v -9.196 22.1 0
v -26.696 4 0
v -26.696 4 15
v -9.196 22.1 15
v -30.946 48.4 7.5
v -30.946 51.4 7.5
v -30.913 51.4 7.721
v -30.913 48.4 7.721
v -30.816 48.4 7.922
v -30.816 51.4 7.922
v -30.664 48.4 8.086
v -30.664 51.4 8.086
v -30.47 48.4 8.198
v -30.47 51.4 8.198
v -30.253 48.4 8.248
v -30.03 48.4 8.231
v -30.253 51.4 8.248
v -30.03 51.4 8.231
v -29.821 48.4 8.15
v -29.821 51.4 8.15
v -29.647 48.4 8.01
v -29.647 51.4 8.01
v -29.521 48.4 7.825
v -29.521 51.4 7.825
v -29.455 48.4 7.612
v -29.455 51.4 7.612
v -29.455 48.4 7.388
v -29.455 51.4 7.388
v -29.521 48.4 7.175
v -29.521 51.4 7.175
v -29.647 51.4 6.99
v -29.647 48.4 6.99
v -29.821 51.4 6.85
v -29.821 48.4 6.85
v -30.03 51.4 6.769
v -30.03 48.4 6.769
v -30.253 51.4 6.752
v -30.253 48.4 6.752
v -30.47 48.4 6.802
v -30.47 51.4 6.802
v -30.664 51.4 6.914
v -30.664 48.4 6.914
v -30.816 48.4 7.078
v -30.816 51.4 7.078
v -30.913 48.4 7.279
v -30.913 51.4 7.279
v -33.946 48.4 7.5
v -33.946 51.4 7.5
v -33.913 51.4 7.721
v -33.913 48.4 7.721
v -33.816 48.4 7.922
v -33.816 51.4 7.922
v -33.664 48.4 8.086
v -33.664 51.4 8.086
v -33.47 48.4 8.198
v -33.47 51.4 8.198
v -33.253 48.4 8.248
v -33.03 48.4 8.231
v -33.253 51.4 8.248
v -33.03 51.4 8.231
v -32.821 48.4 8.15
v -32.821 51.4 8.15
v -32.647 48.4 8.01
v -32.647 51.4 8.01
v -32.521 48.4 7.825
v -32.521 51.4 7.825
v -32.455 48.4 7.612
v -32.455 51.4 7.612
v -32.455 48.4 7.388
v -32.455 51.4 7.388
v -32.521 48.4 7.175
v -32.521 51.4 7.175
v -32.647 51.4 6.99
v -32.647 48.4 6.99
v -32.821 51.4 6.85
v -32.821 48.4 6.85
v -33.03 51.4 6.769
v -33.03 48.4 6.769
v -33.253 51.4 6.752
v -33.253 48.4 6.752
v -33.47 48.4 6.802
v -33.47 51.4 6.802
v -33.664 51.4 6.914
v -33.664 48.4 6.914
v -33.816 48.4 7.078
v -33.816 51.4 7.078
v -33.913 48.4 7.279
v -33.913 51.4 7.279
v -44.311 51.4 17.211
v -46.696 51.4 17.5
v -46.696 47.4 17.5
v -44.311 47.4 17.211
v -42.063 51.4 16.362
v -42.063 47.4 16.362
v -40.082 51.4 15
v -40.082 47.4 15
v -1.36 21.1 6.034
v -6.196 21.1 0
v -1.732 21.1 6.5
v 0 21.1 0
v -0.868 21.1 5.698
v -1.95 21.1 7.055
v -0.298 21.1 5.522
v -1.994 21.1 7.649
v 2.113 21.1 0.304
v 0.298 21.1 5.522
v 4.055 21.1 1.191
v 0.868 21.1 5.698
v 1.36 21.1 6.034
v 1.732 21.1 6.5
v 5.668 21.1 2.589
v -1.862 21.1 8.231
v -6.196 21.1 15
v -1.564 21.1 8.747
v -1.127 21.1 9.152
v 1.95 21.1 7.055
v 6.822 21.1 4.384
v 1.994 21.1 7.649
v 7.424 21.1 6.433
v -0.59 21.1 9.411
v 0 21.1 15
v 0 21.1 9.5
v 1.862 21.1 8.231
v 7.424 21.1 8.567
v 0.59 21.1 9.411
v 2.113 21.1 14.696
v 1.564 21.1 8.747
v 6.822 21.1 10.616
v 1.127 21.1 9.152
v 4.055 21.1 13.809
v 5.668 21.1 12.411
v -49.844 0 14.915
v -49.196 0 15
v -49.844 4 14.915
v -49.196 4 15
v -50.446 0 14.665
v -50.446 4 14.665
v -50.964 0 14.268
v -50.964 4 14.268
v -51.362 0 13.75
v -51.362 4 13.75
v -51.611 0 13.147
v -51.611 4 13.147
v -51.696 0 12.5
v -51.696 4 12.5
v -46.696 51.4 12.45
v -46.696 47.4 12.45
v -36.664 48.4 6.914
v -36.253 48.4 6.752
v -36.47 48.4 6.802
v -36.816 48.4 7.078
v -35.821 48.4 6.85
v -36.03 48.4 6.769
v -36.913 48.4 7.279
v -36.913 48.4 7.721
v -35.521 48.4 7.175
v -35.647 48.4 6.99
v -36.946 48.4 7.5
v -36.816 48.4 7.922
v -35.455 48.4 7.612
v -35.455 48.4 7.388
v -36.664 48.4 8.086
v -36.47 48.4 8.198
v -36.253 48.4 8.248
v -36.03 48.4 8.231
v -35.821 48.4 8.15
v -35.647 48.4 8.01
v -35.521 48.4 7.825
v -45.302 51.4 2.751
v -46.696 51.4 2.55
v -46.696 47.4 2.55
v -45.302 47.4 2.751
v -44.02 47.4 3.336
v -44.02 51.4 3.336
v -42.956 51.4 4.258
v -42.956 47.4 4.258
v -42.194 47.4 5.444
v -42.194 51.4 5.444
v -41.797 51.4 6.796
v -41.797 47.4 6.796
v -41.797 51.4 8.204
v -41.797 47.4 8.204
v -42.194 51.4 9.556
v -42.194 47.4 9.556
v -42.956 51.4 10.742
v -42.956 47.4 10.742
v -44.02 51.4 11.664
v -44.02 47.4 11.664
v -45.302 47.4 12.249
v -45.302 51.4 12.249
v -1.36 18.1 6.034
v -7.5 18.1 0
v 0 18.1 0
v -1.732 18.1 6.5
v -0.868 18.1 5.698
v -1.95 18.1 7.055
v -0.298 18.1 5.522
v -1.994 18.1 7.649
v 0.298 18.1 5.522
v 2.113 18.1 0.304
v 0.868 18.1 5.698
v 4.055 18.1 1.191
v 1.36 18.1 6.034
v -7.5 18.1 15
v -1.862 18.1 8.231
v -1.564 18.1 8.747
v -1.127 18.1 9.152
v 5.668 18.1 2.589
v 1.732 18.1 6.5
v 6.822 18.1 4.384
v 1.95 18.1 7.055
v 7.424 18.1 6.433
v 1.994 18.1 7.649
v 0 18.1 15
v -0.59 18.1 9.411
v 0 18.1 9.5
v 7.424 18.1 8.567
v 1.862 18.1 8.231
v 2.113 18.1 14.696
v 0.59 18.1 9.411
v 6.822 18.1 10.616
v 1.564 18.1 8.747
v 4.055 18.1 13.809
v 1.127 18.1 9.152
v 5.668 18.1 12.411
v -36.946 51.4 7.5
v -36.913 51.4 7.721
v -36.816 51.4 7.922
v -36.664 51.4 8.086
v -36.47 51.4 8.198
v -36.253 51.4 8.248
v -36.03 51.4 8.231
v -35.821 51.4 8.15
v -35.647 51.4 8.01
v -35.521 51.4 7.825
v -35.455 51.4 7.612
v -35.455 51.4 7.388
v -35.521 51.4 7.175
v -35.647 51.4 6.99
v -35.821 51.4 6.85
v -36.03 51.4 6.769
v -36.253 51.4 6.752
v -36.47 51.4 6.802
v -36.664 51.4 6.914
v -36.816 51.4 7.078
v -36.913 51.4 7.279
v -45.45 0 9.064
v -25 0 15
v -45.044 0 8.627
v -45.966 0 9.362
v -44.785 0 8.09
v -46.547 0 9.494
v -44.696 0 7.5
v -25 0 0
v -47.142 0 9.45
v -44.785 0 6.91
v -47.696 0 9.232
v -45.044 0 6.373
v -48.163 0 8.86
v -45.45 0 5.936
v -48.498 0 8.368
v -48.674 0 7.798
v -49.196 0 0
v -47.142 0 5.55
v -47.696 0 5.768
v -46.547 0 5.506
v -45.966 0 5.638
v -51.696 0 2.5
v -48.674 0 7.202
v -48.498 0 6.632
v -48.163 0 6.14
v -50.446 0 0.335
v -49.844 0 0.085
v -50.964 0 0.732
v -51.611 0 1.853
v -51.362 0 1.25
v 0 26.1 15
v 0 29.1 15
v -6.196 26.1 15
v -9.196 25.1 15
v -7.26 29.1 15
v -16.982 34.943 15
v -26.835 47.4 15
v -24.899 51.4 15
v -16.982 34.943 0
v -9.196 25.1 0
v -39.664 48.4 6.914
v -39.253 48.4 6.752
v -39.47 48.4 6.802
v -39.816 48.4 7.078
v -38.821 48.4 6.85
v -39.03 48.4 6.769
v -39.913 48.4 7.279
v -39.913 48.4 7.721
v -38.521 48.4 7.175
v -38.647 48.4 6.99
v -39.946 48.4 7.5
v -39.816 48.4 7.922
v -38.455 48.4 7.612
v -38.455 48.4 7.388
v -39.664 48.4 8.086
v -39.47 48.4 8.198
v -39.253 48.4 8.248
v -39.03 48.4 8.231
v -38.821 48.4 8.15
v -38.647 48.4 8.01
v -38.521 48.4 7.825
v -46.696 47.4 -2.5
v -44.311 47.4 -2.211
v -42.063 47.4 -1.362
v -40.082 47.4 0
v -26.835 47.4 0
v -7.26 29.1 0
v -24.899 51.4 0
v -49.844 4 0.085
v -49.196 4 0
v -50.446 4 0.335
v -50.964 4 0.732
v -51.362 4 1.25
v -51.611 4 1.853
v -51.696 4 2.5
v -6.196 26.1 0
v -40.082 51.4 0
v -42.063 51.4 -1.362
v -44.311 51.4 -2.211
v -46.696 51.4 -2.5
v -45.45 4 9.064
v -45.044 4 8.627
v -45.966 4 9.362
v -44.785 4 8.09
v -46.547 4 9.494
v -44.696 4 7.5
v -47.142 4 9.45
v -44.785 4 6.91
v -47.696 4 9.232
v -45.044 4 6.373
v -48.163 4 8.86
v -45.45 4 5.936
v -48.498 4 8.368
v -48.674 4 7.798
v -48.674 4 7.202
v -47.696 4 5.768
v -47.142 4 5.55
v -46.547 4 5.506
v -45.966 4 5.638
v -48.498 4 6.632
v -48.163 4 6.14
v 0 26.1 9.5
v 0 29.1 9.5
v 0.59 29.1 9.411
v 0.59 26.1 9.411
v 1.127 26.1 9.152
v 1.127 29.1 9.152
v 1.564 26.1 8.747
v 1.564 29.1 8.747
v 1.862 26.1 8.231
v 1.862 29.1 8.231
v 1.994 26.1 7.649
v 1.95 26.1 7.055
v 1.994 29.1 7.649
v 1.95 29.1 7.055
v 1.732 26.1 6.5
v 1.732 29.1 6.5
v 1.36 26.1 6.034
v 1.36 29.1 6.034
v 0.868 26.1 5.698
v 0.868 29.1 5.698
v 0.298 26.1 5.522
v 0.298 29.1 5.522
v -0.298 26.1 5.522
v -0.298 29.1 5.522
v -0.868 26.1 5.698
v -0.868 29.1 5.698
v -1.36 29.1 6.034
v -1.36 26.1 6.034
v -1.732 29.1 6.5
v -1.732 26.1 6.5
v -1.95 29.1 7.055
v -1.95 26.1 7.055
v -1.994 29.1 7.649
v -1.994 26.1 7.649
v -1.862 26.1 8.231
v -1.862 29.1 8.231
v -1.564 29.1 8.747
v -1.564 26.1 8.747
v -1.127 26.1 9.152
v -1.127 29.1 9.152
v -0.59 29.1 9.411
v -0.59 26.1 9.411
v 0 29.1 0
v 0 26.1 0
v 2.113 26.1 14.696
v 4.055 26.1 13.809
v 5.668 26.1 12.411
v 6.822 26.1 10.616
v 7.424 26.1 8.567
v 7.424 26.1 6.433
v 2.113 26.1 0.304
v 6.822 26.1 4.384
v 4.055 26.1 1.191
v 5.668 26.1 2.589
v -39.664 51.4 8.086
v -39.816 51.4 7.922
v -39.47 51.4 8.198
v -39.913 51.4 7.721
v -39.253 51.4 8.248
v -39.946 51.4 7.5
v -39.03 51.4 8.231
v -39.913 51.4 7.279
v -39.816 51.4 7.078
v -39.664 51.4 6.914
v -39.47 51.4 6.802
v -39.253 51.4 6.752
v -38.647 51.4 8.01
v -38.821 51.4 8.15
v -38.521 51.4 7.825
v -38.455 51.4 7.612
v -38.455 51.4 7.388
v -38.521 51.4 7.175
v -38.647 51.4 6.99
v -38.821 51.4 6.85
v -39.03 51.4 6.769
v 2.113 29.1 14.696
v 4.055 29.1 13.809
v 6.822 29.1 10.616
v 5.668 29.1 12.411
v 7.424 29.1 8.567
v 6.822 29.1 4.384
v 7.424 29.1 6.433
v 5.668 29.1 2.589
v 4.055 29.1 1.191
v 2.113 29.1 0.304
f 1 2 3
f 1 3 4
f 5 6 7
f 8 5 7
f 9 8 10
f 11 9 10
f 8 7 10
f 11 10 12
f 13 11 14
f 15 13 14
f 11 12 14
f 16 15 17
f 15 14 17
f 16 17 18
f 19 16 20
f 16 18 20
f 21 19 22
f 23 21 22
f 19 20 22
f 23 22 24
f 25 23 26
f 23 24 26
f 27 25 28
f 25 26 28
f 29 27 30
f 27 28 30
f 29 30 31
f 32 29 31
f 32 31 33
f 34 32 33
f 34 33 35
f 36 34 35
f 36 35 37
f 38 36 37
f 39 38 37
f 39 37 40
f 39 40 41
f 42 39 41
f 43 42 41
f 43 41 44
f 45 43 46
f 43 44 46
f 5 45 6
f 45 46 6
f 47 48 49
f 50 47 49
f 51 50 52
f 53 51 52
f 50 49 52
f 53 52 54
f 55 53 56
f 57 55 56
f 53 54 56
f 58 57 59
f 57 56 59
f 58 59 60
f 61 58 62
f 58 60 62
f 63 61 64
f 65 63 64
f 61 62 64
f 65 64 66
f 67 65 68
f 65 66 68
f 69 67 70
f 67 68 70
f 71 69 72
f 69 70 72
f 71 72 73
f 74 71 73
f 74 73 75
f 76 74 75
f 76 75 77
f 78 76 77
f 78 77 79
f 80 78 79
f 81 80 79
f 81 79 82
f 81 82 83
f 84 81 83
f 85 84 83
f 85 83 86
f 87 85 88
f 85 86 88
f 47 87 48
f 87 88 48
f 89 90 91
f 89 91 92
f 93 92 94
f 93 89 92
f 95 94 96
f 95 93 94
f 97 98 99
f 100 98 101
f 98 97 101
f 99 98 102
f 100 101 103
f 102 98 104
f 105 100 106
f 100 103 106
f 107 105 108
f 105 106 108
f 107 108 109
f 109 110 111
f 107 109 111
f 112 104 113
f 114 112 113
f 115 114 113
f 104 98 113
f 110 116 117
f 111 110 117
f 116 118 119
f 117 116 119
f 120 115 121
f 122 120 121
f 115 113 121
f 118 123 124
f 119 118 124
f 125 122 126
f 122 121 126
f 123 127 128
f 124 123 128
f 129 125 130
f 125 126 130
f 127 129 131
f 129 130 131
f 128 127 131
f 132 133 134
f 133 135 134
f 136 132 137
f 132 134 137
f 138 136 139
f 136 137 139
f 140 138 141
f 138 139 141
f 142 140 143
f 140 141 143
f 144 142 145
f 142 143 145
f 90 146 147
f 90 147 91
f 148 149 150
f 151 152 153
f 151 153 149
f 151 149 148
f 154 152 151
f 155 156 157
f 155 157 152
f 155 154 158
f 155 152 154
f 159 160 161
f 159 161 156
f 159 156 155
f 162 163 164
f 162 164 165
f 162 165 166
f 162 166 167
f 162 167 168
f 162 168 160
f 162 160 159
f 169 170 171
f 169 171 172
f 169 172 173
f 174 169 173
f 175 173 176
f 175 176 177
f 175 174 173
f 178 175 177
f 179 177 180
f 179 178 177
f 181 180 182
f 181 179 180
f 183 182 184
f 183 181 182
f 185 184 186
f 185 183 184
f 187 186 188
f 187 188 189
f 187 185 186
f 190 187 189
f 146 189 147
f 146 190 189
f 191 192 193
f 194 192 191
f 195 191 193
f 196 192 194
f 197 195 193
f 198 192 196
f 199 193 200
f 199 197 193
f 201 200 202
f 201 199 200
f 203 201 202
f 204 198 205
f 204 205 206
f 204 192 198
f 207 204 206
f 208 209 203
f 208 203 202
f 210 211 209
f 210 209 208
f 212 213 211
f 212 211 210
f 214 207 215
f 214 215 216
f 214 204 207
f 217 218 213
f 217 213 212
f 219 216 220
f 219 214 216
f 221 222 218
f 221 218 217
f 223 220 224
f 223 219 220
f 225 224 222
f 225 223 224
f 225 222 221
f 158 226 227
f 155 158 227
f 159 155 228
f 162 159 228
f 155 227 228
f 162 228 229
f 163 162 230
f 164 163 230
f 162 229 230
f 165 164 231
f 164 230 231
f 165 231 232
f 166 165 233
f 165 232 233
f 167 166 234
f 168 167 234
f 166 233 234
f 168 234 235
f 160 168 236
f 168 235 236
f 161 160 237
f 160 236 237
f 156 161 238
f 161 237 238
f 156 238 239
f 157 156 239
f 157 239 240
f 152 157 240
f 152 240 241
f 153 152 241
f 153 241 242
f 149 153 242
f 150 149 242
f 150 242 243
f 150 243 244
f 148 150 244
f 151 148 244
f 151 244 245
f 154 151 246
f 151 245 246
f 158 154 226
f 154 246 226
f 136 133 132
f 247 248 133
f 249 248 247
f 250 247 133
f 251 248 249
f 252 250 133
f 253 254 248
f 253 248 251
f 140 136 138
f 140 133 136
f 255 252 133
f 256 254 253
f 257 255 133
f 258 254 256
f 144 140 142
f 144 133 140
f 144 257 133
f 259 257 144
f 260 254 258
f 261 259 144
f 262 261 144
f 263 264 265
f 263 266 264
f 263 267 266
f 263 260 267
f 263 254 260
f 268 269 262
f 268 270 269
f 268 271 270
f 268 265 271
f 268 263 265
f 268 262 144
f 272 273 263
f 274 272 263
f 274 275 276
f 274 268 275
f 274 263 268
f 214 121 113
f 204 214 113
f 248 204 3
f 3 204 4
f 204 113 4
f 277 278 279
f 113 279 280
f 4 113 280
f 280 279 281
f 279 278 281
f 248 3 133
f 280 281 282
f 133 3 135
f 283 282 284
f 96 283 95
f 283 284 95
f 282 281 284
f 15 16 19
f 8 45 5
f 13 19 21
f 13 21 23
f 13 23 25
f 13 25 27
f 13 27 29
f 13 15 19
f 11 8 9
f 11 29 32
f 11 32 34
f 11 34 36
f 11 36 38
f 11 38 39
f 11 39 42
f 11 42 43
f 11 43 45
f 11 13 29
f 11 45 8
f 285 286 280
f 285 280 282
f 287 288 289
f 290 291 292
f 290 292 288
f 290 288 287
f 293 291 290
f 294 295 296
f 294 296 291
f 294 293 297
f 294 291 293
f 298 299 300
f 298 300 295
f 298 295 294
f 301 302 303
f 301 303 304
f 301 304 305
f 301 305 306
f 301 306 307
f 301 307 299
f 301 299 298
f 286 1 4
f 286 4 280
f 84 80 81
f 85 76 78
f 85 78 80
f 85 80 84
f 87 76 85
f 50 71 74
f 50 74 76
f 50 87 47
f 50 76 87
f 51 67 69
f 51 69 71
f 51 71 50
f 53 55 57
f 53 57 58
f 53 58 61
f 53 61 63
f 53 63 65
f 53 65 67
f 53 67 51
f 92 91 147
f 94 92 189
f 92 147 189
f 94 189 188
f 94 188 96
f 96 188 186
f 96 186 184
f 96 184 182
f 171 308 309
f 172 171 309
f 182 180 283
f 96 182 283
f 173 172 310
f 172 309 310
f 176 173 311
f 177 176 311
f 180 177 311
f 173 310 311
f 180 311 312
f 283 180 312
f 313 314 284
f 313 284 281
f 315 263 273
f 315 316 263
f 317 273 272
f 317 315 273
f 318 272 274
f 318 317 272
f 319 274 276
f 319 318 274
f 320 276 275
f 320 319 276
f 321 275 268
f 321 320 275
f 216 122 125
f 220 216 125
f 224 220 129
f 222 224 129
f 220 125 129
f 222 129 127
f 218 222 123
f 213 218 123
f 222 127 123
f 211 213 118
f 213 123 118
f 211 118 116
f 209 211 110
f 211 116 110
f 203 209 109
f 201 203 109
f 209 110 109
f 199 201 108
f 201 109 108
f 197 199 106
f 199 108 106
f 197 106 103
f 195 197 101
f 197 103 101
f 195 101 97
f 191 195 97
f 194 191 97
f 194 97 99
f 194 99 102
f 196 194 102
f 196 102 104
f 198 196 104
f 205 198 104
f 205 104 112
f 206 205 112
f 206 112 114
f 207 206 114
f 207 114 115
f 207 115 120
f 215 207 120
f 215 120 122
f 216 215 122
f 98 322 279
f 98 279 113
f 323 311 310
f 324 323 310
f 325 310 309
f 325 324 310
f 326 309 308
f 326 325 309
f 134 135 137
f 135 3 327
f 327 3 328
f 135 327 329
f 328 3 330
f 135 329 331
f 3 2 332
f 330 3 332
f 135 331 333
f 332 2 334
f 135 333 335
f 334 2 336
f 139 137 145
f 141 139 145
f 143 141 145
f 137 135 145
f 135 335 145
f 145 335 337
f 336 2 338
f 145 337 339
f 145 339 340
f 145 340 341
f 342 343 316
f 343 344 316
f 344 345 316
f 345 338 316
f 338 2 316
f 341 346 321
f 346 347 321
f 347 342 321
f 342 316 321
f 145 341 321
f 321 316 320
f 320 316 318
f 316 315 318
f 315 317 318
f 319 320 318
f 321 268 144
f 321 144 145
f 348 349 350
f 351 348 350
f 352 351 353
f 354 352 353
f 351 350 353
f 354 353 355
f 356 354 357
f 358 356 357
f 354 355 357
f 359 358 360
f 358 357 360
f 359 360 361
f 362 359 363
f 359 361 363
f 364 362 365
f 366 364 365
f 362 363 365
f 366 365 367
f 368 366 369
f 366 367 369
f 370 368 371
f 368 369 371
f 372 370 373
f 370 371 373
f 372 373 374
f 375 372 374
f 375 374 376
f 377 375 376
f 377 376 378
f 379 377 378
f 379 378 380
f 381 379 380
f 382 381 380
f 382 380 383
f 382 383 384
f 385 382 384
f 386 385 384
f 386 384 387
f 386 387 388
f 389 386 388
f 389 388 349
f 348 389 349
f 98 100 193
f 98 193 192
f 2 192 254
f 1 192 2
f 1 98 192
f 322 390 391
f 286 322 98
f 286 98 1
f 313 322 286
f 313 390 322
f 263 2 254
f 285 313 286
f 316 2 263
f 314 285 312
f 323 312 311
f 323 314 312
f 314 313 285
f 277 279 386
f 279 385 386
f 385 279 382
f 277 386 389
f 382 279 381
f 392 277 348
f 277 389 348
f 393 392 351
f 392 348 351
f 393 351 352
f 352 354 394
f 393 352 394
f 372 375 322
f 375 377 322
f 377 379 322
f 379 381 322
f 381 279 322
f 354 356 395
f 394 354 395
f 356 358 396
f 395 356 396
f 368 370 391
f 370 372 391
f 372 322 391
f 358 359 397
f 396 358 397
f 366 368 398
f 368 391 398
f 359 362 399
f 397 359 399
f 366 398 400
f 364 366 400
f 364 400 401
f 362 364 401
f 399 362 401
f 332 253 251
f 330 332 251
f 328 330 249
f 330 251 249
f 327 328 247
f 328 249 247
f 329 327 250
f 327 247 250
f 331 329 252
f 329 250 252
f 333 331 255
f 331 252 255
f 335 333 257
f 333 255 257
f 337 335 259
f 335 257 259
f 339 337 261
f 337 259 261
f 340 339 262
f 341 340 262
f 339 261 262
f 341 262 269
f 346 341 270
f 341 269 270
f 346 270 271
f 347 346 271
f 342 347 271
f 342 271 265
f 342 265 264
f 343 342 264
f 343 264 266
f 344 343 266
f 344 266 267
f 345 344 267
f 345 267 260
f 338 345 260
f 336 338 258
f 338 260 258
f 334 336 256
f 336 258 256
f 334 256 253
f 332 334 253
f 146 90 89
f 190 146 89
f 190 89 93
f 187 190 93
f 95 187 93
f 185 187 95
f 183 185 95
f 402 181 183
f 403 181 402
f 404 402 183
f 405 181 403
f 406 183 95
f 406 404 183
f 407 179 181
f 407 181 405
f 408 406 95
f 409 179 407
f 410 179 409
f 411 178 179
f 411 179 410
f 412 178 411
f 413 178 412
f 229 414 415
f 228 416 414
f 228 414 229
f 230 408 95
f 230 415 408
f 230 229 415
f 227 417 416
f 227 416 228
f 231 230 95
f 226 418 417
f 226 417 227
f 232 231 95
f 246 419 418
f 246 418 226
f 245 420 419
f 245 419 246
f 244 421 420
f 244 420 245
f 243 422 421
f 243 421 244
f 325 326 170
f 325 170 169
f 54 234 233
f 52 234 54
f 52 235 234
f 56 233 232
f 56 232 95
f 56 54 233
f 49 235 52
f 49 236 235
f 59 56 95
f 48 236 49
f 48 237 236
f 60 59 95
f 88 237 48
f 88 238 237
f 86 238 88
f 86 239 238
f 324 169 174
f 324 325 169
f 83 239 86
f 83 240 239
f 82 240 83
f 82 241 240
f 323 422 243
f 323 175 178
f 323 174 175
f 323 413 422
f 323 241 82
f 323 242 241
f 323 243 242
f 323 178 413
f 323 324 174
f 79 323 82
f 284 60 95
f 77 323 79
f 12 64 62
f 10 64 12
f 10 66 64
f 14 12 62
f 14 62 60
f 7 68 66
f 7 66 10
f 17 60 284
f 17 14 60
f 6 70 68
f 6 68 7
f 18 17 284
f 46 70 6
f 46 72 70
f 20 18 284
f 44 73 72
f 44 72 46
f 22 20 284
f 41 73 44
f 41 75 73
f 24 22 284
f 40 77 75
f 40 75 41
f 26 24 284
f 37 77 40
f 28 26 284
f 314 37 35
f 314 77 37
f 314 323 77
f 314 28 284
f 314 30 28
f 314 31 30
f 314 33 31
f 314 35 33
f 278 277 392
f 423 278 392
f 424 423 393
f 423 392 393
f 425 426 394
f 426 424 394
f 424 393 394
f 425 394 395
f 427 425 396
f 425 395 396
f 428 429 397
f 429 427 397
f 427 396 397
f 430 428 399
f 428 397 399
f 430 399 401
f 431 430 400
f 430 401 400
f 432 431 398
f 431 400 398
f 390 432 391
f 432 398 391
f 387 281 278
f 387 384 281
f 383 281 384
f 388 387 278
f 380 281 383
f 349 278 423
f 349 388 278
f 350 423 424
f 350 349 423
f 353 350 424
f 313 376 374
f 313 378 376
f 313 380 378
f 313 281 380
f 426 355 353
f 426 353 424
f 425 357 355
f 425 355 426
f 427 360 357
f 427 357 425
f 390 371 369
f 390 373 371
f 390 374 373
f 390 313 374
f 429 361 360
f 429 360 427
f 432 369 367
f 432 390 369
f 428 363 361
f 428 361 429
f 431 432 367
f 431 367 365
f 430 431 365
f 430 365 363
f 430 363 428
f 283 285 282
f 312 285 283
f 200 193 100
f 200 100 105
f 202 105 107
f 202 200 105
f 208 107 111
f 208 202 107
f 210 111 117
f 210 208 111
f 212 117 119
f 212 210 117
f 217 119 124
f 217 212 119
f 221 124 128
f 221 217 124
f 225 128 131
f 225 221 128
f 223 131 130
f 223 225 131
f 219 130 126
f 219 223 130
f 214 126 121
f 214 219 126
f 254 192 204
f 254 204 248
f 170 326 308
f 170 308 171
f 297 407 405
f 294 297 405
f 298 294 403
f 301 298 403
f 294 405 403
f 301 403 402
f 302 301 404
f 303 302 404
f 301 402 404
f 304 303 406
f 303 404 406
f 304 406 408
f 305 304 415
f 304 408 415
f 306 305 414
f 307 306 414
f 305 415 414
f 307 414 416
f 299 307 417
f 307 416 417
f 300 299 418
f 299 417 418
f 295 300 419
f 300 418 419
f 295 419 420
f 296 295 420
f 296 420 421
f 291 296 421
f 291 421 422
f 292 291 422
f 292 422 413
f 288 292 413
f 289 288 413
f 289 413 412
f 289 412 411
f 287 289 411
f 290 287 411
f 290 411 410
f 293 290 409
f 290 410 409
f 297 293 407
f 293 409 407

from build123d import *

# Parameters (mm, degrees)
EXTRUDE_1_DEPTH     = 15
SKETCH_2_R          = 2
CUT_EXTRUDE_1_DEPTH = 4
SKETCH_3_R          = 7.5
EXTRUDE_2_DEPTH     = 3
EXTRUDE_START       = -3
SKETCH_4_R          = 7.5
EXTRUDE_3_DEPTH     = 3
SKETCH_5_R          = 2
CUT_EXTRUDE_2_DEPTH = 11
EXTRUDE_4_DEPTH     = 4
SKETCH_6_R          = 0.75
CUT_EXTRUDE_3_DEPTH = 3
FILLET_1_R          = 2.5


with BuildPart() as part:
    # 草圖1 → 填料-伸長1 (new body)
    with BuildSketch(Plane.XY):
        Polygon((-24.89877099, 51.4), (-7.260334344, 29.1), (0, 29.1), (0, 26.1), (-6.196480976, 26.1), (-6.196480976, 21.1), (0, 21.1), (0, 18.1), (-7.5, 18.1), (-25, 0), (-51.696480976, 0), (-51.696480976, 4), (-47.696480976, 4), (-26.696480976, 4), (-9.196480976, 22.1), (-9.196480976, 25.1), (-16.981570729, 34.942567398), (-26.834917623, 47.4), (-41.746480973, 47.4), (-41.746480973, 51.4), align=None)
    extrude(amount=EXTRUDE_1_DEPTH)

    # 草圖2 → 除料-伸長1 (cut)
    with BuildSketch(Plane.XZ):
        with Locations((-46.696480976, 7.5)):
            Circle(SKETCH_2_R)
    extrude(amount=-CUT_EXTRUDE_1_DEPTH, mode=Mode.SUBTRACT)

    # 草圖3 → 填料-伸長2 (add)
    with BuildSketch(Plane.XZ.offset(-18.1)):
        with Locations((0, 7.5)):
            Circle(SKETCH_3_R)
    extrude(amount=-EXTRUDE_2_DEPTH)

    # 草圖4 → 填料-伸長3 (add)
    with BuildSketch(Plane(origin=(0, 29.1, 0), x_dir=(1, 0, 0), z_dir=(0, 1, 0)).offset(EXTRUDE_START)):
        with Locations((0, -7.5)):
            Circle(SKETCH_4_R)
    extrude(amount=EXTRUDE_3_DEPTH)

    # 草圖5 → 除料-伸長2 (cut)
    with BuildSketch(Plane(origin=(0, 29.1, 0), x_dir=(1, 0, 0), z_dir=(0, 1, 0))):
        with Locations(Location((0, -7.5, 0), (0, 0, 270))):
            Circle(SKETCH_5_R)
    extrude(amount=-CUT_EXTRUDE_2_DEPTH, mode=Mode.SUBTRACT)

    # 草圖7 → 填料-伸長4 (add)
    with BuildSketch(Plane(origin=(0, 51.4, 0), x_dir=(1, 0, 0), z_dir=(0, 1, 0))):
        with BuildLine():
            Line((-46.696480973, 2.5), (-46.696480973, -2.55))
            ThreePointArc((-46.696480973, -2.55), (-41.746480973, -7.5), (-46.696480973, -12.45))
            Line((-46.696480973, -12.45), (-46.696480973, -17.5))
            ThreePointArc((-46.696480973, -17.5), (-36.696480973, -7.5), (-46.696480973, 2.5))
        make_face()
    extrude(amount=-EXTRUDE_4_DEPTH)

    # 草圖6 → 除料-伸長3 (cut)
    with BuildSketch(Plane(origin=(0, 51.4, 0), x_dir=(1, 0, 0), z_dir=(0, 1, 0))):
        with Locations(Location((-39.196480973, -7.5, 0), (0, 0, 180))):
            Circle(SKETCH_6_R)
        with Locations(Location((-36.196480973, -7.5, 0), (0, 0, 180))):
            Circle(SKETCH_6_R)
        with Locations(Location((-33.196480973, -7.5, 0), (0, 0, 180))):
            Circle(SKETCH_6_R)
        with Locations(Location((-30.196480973, -7.5, 0), (0, 0, 180))):
            Circle(SKETCH_6_R)
    extrude(amount=-CUT_EXTRUDE_3_DEPTH, mode=Mode.SUBTRACT)

    # 圓角1
    fillet_1_edges = [part.edges().sort_by_distance(p)[0] for p in [
        (-51.696480976, 2, 0),
        (-51.696480976, 2, 15),
    ]]
    fillet(fillet_1_edges, radius=FILLET_1_R)


solid = part.part
